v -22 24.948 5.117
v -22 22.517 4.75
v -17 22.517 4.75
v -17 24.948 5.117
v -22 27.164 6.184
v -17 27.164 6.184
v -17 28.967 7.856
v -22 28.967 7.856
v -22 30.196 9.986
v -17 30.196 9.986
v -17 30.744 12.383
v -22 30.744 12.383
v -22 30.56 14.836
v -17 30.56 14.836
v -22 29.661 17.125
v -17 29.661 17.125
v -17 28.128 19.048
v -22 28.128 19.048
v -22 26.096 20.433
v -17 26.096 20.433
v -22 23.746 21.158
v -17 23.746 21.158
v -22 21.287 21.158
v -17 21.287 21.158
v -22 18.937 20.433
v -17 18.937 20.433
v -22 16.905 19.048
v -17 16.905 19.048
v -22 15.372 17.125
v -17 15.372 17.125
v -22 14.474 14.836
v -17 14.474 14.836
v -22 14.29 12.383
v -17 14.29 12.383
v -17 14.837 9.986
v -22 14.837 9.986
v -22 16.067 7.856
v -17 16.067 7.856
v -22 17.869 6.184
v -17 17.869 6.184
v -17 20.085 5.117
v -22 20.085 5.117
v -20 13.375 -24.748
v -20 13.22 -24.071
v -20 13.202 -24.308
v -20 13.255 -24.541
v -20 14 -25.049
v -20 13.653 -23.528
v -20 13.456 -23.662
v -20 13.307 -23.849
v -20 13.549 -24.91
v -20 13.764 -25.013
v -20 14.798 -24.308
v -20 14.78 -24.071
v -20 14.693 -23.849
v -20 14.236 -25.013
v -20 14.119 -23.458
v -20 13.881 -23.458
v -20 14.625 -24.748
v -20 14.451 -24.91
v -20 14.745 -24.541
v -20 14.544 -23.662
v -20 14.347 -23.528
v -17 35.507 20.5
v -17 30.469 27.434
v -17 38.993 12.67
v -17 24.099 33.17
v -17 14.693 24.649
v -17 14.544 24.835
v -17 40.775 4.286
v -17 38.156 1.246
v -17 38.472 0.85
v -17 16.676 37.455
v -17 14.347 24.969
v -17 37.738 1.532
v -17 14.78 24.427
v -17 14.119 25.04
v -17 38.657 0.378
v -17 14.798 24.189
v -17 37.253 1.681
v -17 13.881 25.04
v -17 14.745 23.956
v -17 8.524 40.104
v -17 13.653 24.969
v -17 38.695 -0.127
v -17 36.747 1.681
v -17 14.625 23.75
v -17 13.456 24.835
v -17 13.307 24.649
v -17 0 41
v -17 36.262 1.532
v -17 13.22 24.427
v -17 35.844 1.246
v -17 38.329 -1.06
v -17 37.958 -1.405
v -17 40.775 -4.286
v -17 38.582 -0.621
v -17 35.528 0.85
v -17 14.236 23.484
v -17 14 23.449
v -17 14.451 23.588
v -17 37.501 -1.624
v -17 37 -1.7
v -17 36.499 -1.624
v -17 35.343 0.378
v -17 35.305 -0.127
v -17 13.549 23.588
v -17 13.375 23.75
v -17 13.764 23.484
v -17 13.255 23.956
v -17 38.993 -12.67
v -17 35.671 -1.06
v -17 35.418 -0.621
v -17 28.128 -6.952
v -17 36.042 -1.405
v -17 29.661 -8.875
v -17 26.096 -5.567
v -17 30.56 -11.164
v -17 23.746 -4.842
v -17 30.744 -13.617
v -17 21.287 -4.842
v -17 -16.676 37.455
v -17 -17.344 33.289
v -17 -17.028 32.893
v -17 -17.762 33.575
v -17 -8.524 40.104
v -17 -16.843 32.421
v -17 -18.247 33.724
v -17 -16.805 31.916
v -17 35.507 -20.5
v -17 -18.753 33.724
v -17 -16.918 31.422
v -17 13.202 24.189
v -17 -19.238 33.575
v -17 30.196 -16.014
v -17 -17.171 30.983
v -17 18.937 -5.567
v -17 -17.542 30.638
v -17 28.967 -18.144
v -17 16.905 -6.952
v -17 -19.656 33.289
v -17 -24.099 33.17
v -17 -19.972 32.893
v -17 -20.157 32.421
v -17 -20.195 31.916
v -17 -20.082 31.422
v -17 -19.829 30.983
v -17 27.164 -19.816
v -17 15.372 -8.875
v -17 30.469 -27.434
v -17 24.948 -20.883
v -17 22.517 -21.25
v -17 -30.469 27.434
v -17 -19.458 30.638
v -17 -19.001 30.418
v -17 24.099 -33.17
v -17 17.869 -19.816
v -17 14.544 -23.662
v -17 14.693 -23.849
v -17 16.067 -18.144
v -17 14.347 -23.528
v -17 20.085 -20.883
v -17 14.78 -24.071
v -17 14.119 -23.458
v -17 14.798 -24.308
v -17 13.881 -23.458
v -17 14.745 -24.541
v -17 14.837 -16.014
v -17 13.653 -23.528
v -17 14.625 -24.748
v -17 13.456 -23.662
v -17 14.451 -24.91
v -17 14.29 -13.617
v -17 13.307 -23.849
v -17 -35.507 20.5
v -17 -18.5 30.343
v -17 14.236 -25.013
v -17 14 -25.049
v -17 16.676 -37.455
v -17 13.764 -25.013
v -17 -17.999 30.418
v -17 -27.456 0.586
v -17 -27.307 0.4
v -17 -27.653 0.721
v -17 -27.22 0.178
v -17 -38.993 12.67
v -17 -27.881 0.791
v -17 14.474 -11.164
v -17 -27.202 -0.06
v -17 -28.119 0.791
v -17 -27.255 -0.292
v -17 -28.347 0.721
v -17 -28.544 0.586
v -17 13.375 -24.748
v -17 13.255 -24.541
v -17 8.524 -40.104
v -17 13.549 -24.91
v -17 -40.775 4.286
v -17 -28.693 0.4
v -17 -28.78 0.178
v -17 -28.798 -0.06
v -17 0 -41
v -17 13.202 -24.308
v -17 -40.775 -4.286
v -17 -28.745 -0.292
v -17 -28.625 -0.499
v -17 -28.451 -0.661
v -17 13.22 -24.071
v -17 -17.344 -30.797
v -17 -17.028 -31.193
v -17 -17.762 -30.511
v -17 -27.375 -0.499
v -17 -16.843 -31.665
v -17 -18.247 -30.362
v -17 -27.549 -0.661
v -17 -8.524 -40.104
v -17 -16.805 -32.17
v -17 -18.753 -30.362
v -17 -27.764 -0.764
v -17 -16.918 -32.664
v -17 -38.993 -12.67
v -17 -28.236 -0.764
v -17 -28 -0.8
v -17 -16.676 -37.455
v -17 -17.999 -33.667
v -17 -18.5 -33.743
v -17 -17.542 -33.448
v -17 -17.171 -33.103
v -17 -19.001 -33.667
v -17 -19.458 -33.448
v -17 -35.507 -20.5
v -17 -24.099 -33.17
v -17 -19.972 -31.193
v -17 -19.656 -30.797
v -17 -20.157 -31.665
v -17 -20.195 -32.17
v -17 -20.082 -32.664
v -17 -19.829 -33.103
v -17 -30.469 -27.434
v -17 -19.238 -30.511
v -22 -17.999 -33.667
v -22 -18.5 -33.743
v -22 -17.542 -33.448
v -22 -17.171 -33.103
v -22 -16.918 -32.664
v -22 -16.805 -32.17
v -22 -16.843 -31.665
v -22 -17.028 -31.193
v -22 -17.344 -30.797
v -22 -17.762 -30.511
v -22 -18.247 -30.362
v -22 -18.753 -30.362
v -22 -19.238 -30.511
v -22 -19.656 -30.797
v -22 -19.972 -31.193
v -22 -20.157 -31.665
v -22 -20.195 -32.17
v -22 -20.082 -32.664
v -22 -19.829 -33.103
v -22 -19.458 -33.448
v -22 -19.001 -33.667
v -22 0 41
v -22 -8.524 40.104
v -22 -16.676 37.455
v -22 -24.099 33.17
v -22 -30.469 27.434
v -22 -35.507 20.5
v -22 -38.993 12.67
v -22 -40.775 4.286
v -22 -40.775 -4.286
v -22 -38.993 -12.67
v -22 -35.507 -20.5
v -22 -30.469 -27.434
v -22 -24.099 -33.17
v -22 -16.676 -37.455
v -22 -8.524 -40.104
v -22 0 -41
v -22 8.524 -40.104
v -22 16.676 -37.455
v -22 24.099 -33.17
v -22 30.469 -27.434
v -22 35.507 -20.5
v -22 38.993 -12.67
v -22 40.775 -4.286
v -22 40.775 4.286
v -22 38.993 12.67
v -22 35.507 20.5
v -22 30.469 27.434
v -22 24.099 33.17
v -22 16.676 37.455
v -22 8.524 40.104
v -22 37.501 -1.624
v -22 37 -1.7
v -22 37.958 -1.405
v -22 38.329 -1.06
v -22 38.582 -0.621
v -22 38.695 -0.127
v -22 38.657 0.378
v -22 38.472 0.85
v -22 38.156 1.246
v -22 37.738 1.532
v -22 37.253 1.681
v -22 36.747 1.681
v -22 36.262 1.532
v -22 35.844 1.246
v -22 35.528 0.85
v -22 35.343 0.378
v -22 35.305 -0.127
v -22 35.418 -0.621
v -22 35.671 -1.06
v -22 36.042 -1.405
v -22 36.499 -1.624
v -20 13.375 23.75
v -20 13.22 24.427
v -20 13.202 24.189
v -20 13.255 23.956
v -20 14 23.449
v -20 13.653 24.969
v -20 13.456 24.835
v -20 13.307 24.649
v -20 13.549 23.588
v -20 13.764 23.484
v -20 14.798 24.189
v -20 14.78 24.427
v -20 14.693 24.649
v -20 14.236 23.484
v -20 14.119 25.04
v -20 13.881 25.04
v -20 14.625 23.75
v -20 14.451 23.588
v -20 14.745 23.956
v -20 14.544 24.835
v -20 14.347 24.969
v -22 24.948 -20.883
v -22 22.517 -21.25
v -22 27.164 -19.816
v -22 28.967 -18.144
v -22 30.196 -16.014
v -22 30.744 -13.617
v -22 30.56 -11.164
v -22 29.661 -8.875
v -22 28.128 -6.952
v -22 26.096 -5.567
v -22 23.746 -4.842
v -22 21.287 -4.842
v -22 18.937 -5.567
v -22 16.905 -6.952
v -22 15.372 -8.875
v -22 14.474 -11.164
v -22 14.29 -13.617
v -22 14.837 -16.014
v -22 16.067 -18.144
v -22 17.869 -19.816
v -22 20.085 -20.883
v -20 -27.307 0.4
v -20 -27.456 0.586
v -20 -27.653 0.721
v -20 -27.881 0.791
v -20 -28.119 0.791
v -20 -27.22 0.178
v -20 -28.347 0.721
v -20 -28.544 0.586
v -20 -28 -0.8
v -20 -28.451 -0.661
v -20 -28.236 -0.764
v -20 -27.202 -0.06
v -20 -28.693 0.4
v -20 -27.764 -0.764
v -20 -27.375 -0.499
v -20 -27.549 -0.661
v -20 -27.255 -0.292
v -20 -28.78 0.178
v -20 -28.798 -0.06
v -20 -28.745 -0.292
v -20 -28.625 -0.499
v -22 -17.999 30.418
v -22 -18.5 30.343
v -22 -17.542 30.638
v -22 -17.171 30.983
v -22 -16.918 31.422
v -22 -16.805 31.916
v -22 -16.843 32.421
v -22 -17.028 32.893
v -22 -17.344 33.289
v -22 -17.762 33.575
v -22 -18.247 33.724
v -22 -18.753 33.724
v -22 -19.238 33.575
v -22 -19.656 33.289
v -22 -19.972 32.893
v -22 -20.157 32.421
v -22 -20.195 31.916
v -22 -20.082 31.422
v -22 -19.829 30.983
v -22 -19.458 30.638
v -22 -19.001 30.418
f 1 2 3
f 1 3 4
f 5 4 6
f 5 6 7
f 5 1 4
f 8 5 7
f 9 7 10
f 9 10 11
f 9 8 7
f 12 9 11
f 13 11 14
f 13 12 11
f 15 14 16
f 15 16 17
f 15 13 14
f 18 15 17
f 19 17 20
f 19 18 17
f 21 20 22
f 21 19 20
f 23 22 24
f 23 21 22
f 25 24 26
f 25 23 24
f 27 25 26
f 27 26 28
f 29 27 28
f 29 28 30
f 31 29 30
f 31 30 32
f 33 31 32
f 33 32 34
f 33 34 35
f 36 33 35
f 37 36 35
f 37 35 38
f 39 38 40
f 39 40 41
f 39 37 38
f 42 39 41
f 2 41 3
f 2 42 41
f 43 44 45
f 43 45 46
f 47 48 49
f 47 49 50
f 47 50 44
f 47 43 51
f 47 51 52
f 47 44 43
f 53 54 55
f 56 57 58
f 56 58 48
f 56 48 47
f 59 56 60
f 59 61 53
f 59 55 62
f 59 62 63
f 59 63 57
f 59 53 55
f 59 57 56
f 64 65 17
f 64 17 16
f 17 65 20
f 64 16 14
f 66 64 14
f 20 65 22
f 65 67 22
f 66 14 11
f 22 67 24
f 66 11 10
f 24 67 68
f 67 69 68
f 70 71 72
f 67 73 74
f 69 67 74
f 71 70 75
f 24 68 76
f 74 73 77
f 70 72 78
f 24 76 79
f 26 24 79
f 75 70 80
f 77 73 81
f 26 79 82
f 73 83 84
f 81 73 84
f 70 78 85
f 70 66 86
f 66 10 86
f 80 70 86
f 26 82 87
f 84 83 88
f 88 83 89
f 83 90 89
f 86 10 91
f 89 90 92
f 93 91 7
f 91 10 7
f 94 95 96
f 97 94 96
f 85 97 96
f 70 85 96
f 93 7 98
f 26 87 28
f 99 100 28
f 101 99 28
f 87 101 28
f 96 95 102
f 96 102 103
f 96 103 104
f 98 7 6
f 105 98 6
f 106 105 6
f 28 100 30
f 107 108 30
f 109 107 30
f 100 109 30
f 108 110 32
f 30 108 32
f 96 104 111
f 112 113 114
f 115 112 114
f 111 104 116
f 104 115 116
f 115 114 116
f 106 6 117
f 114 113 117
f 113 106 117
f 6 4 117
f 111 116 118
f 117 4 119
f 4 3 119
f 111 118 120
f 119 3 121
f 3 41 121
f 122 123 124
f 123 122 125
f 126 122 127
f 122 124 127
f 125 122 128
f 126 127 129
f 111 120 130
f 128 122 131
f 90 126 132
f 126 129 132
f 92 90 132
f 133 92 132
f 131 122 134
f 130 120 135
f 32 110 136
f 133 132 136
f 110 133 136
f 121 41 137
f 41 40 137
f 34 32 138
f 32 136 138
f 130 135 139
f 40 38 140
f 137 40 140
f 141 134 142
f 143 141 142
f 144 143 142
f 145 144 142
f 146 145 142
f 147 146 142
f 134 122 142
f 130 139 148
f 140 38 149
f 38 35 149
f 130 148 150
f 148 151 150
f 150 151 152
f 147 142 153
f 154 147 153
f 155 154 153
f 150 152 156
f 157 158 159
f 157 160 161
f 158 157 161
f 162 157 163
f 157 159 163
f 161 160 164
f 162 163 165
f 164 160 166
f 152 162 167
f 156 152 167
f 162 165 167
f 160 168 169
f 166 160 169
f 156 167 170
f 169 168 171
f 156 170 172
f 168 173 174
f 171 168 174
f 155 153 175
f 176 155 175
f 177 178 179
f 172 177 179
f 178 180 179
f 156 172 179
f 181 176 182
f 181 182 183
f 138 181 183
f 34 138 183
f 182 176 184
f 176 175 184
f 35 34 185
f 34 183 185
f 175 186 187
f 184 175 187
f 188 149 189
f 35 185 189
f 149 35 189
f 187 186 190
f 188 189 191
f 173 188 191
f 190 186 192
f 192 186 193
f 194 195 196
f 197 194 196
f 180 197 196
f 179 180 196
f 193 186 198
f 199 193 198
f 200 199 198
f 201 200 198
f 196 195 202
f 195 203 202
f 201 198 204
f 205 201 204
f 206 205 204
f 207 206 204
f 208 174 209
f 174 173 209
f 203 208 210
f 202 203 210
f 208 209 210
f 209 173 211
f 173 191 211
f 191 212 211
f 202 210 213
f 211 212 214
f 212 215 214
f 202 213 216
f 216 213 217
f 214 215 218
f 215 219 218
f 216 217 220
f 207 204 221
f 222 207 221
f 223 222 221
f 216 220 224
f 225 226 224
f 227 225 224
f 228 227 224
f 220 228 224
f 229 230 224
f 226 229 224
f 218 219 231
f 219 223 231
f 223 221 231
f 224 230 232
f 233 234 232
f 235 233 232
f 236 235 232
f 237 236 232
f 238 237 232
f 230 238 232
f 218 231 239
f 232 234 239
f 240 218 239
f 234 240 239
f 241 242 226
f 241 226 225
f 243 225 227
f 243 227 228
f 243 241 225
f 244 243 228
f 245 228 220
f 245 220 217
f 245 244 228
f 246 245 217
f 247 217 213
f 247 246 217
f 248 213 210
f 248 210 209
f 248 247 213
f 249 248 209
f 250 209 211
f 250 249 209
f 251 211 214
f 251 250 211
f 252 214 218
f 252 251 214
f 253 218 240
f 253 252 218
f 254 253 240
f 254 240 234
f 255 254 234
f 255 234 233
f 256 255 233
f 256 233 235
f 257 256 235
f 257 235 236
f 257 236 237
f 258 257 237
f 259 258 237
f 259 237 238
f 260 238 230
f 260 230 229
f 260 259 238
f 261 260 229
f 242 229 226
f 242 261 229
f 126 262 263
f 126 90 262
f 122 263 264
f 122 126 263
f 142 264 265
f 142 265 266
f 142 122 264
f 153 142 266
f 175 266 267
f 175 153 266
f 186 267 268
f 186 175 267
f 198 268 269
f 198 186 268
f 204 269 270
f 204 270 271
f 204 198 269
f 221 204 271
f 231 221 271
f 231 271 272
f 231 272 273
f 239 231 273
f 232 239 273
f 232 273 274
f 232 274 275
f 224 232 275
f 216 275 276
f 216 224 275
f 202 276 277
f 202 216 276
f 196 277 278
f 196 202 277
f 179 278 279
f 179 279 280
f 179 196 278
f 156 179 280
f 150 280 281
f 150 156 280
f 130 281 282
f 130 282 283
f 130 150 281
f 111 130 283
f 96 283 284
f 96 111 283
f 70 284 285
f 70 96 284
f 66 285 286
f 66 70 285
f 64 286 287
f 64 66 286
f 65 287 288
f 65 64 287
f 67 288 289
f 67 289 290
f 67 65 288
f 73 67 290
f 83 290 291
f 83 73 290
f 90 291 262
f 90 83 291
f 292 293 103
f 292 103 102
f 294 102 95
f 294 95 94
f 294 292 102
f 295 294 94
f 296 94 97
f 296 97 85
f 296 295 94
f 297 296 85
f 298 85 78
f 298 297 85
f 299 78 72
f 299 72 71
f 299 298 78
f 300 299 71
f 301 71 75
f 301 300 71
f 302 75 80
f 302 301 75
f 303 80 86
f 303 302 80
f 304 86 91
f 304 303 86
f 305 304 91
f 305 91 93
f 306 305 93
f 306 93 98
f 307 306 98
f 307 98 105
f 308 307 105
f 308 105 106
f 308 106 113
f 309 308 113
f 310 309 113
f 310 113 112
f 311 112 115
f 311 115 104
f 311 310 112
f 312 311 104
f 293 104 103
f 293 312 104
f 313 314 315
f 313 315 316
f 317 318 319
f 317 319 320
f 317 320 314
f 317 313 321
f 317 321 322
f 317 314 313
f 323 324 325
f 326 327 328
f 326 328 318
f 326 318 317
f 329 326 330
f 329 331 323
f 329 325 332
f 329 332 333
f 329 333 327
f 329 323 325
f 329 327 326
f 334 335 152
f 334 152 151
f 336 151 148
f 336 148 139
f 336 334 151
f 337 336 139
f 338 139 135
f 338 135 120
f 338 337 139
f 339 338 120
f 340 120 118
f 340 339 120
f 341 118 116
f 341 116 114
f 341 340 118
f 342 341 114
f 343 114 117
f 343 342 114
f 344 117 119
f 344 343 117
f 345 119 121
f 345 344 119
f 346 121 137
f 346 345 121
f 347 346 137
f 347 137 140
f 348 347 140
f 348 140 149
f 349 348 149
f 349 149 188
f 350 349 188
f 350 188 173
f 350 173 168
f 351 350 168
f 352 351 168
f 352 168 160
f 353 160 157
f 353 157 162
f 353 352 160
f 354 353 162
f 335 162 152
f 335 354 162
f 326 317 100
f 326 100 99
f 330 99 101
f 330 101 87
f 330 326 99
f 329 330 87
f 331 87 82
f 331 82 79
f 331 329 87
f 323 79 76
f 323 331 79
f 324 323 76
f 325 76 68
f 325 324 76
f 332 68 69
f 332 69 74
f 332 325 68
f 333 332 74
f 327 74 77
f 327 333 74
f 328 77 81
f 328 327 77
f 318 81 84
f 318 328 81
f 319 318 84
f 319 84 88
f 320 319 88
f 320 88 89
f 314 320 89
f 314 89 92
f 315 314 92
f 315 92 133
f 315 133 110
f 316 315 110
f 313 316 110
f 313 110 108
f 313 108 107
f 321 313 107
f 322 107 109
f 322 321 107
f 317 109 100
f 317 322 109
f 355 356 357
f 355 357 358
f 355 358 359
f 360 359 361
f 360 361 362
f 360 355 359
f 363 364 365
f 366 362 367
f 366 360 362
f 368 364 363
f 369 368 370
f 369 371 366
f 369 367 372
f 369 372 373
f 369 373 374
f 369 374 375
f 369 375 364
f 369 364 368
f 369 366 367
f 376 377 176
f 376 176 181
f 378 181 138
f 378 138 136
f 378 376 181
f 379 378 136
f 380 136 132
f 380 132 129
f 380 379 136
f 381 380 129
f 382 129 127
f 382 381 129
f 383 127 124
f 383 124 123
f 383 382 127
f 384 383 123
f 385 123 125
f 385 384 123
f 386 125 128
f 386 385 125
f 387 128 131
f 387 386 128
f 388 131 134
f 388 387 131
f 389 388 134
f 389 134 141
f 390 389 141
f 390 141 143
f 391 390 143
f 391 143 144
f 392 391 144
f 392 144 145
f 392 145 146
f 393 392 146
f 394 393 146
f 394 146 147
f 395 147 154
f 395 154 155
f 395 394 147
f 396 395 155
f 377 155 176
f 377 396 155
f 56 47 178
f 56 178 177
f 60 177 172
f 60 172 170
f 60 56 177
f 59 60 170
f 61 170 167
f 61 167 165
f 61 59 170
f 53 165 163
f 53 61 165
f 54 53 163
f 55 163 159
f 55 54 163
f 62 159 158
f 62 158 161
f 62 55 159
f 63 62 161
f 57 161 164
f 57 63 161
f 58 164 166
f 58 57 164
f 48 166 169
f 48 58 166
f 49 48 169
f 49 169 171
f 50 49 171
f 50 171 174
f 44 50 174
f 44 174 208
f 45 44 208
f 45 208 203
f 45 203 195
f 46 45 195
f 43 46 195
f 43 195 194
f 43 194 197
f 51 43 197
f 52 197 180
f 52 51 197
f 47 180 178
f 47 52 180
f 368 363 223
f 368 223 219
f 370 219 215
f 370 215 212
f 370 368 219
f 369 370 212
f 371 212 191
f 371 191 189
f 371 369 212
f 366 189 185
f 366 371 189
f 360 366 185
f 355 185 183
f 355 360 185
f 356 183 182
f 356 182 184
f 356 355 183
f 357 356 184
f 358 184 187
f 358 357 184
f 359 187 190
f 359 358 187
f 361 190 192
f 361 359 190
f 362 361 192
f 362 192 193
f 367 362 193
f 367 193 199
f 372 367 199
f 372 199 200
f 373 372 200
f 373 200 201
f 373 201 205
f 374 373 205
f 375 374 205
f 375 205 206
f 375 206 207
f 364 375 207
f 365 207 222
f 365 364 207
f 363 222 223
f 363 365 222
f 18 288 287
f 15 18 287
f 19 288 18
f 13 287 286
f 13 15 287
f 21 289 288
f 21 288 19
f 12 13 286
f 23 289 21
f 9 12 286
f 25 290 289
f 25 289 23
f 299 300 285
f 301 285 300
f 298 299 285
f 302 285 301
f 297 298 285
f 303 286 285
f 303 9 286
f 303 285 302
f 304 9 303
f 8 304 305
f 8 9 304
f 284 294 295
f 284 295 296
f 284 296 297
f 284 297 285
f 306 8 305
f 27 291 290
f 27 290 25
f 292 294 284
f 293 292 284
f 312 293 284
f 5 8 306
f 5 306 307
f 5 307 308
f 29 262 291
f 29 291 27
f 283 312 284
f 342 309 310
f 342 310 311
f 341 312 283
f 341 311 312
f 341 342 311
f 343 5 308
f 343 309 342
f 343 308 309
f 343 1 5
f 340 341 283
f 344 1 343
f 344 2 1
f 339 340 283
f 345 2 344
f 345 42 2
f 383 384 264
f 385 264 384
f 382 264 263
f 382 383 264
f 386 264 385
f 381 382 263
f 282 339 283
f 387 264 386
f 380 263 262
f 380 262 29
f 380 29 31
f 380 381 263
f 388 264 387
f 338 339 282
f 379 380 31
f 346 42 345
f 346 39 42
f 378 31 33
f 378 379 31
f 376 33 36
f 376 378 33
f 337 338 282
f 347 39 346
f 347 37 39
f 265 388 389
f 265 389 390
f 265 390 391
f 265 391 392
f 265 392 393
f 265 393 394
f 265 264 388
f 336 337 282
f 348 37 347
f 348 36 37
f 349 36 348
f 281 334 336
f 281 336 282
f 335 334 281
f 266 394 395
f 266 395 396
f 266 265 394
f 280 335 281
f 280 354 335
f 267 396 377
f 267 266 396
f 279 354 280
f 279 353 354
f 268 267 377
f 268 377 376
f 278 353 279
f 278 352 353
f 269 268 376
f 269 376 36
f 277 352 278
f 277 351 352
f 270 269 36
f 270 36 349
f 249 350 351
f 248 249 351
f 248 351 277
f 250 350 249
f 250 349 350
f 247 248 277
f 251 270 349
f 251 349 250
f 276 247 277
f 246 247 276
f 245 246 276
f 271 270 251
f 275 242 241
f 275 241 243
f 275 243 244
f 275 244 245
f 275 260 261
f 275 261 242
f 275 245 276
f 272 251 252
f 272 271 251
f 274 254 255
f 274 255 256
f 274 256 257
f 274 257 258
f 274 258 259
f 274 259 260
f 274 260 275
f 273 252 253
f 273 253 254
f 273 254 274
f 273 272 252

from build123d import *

# Parameters (mm, degrees)
AXIAL_BLANK_PROFILE_W                          = 5
AXIAL_BLANK_PROFILE_H                          = 41
TWO_START                                      = -22
TWO_FITTING_ROUTE_CLEARANCE_BORES_DI_2_R       = 8.25
TWO_FITTING_ROUTE_CLEARANCE_BORES_DIAMET_DEPTH = 5
THREE_START                                    = -22
THREE_LONG_MOUNTING_SCREW_CLEARANCES_SKE_R     = 1.7
THREE_LONG_MOUNTING_SCREW_CLEARANCES_DEPTH     = 5
THREE_START_2                                  = -20
THREE_M2_LOCATOR_RECEIVING_PILOTS_DE_2_R       = 0.8
THREE_M2_LOCATOR_RECEIVING_PILOTS_DEPTH3_DEPTH = 3


with BuildPart() as part:
    # Axial blank profile → Native revolved blank (revolve)
    with BuildSketch(Plane.XY, mode=Mode.PRIVATE) as native_revolved_blank_sk:
        with Locations((-19.5, 20.5)):
            Rectangle(AXIAL_BLANK_PROFILE_W, AXIAL_BLANK_PROFILE_H)
    revolve(native_revolved_blank_sk.sketch.rotate(Axis((-60, 0, 0), (1, 0, 0)), 90), axis=Axis((-60, 0, 0), (1, 0, 0)))

    # Two fitting-route clearance bores di 2 → Two fitting-route clearance bores diamet (cut)
    with BuildSketch(Plane(origin=(0, 0, 0), x_dir=(0, 0, -1), z_dir=(1, 0, 0)).offset(TWO_START)):
        with Locations((-13, 22.516660498)):
            Circle(TWO_FITTING_ROUTE_CLEARANCE_BORES_DI_2_R)
        with Locations((13, 22.516660498)):
            Circle(TWO_FITTING_ROUTE_CLEARANCE_BORES_DI_2_R)
    extrude(amount=TWO_FITTING_ROUTE_CLEARANCE_BORES_DIAMET_DEPTH, mode=Mode.SUBTRACT)

    # Three long mounting screw clearances sketch → Three long mounting screw clearances (cut)
    with BuildSketch(Plane(origin=(0, 0, 0), x_dir=(0, 0, -1), z_dir=(1, 0, 0)).offset(THREE_START)):
        with Locations((0, 37)):
            Circle(THREE_LONG_MOUNTING_SCREW_CLEARANCES_SKE_R)
        with Locations((-32.04293994, -18.5)):
            Circle(THREE_LONG_MOUNTING_SCREW_CLEARANCES_SKE_R)
        with Locations((32.04293994, -18.5)):
            Circle(THREE_LONG_MOUNTING_SCREW_CLEARANCES_SKE_R)
    extrude(amount=THREE_LONG_MOUNTING_SCREW_CLEARANCES_DEPTH, mode=Mode.SUBTRACT)

    # Three M2 locator receiving pilots de 2 → Three M2 locator receiving pilots depth3 (cut)
    with BuildSketch(Plane(origin=(0, 0, 0), x_dir=(0, 0, -1), z_dir=(1, 0, 0)).offset(THREE_START_2)):
        with Locations((-24.248711306, 14)):
            Circle(THREE_M2_LOCATOR_RECEIVING_PILOTS_DE_2_R)
        with Locations((0, -28)):
            Circle(THREE_M2_LOCATOR_RECEIVING_PILOTS_DE_2_R)
        with Locations((24.248711306, 14)):
            Circle(THREE_M2_LOCATOR_RECEIVING_PILOTS_DE_2_R)
    extrude(amount=THREE_M2_LOCATOR_RECEIVING_PILOTS_DEPTH3_DEPTH, mode=Mode.SUBTRACT)


solid = part.part
